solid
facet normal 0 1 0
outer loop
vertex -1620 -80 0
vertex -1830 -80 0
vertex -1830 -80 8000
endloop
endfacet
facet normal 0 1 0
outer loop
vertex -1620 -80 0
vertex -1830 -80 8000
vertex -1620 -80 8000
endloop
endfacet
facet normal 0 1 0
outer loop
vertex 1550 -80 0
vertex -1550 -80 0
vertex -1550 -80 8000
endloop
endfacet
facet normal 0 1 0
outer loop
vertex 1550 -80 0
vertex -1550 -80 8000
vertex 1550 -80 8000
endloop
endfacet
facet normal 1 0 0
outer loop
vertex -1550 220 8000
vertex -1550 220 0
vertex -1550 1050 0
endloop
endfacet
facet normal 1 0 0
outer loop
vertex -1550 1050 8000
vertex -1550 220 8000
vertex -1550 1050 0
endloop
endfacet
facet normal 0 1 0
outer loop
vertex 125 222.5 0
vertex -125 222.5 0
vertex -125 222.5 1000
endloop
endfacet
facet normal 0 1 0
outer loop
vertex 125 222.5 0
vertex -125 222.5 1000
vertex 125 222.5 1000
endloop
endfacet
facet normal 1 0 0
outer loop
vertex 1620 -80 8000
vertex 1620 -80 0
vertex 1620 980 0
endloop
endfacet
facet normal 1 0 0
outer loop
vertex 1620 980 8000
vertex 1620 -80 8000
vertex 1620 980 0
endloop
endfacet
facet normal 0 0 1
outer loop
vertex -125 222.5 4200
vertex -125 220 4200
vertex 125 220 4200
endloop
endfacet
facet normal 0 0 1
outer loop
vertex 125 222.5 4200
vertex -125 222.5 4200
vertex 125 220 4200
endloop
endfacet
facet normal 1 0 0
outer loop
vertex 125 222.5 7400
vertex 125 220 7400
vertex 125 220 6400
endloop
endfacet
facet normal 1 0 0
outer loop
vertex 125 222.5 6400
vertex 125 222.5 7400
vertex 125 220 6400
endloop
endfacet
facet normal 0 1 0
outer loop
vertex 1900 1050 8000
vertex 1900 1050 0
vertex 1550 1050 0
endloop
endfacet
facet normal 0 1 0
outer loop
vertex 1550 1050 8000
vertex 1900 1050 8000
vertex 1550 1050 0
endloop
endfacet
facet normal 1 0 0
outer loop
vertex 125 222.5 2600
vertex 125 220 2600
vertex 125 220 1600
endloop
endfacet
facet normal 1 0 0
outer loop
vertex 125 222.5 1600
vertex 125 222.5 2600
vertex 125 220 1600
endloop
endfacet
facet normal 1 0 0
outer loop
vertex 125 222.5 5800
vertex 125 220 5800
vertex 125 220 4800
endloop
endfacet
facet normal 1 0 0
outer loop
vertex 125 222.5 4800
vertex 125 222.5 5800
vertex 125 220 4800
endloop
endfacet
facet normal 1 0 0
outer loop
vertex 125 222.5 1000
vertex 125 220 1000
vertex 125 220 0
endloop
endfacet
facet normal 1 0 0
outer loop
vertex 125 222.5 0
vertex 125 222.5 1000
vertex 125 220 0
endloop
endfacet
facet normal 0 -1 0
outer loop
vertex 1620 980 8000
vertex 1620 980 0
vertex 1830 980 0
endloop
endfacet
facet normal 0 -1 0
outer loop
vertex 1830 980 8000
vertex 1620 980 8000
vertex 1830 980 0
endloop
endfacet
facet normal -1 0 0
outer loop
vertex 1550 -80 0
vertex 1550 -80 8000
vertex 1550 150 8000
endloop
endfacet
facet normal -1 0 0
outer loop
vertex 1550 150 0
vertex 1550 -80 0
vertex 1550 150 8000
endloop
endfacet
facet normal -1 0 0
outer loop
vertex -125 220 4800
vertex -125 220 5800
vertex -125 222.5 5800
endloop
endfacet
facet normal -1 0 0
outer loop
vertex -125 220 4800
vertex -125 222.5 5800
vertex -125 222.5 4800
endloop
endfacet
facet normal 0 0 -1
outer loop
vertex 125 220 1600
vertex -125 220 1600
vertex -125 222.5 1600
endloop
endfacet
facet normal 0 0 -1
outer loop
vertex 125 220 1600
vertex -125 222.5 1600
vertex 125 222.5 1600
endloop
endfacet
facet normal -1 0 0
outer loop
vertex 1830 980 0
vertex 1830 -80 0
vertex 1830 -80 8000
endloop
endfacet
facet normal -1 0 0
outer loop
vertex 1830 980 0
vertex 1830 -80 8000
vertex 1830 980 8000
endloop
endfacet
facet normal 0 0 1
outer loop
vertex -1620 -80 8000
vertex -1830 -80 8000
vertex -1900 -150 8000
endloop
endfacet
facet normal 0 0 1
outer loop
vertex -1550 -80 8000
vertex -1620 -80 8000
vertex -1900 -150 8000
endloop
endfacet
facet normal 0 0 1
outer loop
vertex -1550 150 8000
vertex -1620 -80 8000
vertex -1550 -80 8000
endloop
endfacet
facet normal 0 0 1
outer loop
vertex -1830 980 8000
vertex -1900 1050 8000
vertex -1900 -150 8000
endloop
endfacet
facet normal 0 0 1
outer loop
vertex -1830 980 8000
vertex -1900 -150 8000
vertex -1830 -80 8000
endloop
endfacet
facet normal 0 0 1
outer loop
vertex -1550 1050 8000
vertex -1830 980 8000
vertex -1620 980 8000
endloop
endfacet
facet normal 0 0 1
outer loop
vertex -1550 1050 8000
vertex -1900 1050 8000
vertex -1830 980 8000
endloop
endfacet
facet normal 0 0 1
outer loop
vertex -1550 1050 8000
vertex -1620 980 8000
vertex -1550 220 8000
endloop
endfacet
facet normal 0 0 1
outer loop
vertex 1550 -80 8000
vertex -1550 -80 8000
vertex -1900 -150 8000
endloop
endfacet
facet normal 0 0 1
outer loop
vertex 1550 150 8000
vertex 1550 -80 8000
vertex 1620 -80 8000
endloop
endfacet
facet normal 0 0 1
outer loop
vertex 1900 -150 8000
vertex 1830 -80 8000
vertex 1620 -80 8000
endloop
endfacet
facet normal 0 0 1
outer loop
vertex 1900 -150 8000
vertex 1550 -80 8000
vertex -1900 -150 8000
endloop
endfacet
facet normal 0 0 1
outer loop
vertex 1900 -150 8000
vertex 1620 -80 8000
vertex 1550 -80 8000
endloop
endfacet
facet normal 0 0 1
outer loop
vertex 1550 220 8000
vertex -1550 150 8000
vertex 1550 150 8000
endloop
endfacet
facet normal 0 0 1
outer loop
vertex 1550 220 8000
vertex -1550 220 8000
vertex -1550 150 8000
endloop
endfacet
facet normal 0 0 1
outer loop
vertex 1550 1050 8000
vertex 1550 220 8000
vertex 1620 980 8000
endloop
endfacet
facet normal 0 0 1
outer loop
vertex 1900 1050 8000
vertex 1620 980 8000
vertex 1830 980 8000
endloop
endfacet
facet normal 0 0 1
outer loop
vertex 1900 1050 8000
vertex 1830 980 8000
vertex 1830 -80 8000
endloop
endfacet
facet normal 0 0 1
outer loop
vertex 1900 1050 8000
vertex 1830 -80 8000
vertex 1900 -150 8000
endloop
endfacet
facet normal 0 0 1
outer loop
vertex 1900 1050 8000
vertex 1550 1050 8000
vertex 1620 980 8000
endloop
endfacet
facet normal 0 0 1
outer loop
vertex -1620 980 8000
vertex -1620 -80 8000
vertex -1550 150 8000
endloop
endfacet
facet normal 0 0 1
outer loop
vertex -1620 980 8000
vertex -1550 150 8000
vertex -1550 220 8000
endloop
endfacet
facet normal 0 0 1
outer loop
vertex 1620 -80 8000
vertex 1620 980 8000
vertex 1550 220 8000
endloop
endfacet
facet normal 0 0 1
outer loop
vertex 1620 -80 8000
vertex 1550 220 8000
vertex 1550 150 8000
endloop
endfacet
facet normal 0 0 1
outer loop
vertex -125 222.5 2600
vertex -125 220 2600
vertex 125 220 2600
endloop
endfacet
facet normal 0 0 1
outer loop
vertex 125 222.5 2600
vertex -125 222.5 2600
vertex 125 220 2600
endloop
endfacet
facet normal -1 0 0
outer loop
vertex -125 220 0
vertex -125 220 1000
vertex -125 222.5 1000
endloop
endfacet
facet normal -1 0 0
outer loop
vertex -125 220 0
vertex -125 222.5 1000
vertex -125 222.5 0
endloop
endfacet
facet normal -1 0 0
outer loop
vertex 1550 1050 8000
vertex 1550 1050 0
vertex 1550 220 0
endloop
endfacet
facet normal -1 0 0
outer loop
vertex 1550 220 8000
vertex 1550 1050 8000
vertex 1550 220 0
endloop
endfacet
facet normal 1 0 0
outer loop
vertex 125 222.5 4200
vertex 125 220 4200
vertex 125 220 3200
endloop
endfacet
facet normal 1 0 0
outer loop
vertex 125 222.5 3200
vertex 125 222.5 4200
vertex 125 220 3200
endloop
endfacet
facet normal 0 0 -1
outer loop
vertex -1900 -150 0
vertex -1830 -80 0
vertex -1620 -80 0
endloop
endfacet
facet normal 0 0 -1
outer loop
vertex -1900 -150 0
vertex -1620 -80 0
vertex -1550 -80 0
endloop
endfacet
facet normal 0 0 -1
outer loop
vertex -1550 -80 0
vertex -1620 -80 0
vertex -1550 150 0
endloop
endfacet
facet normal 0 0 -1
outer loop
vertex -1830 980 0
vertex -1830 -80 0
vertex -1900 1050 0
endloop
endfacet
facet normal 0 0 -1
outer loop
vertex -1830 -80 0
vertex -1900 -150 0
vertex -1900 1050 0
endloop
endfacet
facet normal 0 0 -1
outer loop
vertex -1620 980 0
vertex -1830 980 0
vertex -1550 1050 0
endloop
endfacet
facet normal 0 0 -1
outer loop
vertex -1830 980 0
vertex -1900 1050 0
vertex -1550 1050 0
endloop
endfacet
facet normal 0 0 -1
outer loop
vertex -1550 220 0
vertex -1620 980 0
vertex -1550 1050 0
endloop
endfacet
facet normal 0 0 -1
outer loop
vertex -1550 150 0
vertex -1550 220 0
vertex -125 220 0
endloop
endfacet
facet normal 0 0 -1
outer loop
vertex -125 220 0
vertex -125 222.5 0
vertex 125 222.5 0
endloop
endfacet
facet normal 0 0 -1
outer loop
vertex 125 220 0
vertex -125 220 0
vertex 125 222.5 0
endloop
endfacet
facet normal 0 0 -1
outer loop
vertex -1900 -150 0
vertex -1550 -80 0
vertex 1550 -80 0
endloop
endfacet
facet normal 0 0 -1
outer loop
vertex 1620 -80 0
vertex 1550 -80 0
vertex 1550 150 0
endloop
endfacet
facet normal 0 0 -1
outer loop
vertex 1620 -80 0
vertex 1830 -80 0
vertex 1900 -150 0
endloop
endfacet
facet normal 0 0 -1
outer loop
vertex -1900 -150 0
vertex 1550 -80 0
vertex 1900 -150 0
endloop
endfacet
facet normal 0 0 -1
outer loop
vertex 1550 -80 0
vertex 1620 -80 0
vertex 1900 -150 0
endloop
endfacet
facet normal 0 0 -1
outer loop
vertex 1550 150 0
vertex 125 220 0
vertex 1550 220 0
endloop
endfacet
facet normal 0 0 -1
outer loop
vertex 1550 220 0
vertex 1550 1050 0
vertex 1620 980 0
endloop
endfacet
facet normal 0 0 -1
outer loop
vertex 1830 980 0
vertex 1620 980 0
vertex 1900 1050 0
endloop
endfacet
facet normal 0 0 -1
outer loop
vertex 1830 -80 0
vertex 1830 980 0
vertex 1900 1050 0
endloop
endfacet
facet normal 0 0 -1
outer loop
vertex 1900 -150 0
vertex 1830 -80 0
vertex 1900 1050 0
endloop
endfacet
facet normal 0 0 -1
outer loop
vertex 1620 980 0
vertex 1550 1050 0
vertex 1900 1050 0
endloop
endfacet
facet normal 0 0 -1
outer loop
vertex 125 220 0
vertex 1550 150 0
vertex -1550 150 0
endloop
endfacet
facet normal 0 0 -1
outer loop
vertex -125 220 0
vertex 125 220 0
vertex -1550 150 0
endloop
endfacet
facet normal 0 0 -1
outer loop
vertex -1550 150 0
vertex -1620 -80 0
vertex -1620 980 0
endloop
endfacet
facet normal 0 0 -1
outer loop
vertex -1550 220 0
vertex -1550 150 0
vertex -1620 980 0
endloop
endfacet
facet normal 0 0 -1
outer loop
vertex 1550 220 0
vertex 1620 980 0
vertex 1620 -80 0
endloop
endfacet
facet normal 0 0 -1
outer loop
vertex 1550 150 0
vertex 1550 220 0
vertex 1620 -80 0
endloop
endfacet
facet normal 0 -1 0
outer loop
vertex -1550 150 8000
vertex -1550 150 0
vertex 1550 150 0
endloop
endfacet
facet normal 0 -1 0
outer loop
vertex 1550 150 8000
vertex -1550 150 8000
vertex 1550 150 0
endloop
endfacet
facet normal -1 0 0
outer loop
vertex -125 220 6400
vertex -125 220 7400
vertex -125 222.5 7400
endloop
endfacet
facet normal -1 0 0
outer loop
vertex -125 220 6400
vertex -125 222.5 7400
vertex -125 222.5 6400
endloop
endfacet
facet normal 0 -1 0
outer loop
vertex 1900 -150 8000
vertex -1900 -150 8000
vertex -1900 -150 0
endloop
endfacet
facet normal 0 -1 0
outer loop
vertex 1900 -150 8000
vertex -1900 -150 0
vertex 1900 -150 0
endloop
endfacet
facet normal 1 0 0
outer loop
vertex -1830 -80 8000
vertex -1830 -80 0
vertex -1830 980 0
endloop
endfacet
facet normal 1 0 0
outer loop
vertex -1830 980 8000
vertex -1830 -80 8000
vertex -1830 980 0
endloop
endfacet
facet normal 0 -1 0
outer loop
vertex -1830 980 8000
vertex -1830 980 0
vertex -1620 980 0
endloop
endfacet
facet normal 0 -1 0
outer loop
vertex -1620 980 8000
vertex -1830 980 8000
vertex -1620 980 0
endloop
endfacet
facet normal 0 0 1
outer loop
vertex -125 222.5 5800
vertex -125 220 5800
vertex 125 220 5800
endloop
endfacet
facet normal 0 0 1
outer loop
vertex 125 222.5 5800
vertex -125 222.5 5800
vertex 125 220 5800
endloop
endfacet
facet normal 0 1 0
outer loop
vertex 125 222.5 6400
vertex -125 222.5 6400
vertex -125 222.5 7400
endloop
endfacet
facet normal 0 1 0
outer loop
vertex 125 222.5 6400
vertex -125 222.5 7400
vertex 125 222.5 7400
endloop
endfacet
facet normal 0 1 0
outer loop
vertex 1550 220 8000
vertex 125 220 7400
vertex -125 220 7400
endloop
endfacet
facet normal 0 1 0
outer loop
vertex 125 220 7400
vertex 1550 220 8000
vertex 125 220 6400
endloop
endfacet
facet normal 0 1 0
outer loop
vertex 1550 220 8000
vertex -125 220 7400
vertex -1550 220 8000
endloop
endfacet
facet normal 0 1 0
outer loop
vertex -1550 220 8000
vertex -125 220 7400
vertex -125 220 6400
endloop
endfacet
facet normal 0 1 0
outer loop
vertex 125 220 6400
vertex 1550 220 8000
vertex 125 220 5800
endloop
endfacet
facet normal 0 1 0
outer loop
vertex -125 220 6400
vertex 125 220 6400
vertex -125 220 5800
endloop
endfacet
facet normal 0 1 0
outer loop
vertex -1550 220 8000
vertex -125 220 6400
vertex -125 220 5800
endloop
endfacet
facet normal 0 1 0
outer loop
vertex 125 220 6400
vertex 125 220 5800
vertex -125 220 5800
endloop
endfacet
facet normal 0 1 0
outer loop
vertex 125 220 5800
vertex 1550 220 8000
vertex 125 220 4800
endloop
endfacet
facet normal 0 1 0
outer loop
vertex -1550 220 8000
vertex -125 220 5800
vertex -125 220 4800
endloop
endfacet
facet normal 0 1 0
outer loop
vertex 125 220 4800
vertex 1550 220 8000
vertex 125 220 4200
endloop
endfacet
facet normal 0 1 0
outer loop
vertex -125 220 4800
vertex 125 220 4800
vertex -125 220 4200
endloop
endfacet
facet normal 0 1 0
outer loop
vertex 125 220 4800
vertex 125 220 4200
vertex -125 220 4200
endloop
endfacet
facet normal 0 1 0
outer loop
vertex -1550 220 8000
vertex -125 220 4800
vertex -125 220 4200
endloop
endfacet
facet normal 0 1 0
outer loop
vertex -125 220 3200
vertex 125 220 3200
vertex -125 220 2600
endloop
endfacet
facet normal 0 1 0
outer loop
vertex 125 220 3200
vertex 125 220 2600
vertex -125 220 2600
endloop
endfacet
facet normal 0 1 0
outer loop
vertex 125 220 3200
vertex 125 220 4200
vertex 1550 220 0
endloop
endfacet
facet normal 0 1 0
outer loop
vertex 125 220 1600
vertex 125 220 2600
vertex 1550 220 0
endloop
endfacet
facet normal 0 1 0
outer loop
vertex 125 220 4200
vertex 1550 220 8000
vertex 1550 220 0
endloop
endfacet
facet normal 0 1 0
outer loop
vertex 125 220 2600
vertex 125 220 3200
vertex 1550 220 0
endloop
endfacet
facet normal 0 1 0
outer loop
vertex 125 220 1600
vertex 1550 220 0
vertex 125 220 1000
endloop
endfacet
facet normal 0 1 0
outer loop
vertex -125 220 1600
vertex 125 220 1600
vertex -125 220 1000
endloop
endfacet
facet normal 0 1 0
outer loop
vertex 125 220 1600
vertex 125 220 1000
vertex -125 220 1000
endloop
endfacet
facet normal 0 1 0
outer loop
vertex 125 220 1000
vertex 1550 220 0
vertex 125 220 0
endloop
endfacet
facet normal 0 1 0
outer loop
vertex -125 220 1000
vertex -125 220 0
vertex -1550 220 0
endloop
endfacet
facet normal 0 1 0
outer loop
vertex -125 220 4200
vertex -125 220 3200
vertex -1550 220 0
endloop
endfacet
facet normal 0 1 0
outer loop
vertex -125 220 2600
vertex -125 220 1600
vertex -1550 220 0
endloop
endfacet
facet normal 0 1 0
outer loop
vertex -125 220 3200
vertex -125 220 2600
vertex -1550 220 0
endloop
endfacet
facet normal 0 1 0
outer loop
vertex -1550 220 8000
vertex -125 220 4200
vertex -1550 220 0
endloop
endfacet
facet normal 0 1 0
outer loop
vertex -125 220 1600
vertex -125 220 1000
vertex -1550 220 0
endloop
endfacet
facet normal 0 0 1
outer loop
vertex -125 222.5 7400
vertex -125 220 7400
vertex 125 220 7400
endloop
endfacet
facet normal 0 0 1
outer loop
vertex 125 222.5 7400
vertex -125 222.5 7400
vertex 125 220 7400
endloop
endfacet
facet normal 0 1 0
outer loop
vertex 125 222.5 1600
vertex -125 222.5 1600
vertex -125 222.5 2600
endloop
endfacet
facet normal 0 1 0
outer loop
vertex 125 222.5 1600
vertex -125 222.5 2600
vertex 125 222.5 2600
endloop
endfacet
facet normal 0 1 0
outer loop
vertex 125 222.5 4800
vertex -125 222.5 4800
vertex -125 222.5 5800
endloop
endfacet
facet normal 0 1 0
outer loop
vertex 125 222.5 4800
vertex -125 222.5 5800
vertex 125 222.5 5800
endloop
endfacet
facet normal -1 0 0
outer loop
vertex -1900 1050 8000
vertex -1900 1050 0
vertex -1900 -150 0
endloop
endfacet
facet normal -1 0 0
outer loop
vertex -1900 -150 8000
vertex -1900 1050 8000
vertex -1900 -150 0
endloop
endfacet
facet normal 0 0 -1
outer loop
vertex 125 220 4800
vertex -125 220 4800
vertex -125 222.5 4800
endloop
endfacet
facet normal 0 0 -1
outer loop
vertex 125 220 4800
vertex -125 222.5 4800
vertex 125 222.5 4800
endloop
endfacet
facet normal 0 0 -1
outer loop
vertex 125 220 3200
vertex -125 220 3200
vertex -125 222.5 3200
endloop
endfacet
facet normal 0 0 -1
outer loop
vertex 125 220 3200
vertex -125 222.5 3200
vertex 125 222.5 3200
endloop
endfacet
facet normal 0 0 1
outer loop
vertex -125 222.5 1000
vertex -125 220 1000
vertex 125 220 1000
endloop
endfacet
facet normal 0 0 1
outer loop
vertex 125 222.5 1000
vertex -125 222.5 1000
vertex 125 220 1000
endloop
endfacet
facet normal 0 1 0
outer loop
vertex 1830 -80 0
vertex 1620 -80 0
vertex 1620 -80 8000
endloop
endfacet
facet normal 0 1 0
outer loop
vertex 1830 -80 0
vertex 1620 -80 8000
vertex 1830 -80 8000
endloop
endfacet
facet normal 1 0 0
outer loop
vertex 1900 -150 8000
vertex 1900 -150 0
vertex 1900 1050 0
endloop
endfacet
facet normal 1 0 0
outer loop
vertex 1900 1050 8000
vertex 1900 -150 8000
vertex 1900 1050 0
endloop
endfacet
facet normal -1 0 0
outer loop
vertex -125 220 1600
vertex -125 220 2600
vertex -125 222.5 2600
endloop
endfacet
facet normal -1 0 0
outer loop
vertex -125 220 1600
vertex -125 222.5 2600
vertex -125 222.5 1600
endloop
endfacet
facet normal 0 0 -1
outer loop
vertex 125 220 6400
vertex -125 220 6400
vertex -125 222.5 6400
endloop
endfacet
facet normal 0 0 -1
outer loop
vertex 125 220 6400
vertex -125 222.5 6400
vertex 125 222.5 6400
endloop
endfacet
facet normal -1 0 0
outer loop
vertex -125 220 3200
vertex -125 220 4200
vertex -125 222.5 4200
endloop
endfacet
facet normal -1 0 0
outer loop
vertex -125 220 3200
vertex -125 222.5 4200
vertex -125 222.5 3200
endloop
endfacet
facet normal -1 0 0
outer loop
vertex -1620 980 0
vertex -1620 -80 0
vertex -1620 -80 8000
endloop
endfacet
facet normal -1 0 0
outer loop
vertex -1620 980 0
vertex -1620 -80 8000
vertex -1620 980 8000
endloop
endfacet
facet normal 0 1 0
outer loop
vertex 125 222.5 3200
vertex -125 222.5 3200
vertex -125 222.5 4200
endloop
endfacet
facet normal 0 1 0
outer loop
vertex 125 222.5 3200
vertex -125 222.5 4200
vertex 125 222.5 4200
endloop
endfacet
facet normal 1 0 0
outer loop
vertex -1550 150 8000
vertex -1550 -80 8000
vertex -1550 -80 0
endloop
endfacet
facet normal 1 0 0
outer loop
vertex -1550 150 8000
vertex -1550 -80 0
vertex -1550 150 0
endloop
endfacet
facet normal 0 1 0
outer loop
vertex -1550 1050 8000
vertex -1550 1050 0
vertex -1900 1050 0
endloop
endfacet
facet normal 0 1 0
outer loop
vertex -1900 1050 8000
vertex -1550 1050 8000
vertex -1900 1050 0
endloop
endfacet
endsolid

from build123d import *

# Parameters (mm, degrees)
EXTRUDE_THIN1_OUTLINE_W   = 3100
EXTRUDE_THIN1_OUTLINE_H   = 230
EXTRUDE_THIN1_OUTLINE_W_2 = 210
EXTRUDE_THIN1_OUTLINE_H_2 = 1060
EXTRUDE_THIN1_DEPTH       = 8000
SKETCH4_W                 = 250
SKETCH4_H                 = 1000
BOSS_EXTRUDE2_DEPTH       = 2.5
LPATTERN1_COUNT           = 5
LPATTERN1_PITCH           = 1600


# Read off the part's stored shape, not the designer's step: Extrude-Thin1
with BuildPart() as part:
    # Extrude-Thin1 outline → Extrude-Thin1 (new body)
    with BuildSketch(Plane.XY):
        Polygon((-1900, 1050), (-1900, -150), (1900, -150), (1900, 1050), (1550, 1050), (1550, 220), (-1550, 220), (-1550, 1050), align=None)
        with Locations((0, 35)):
            Rectangle(EXTRUDE_THIN1_OUTLINE_W, EXTRUDE_THIN1_OUTLINE_H, mode=Mode.SUBTRACT)
        with Locations((-1725, 450)):
            Rectangle(EXTRUDE_THIN1_OUTLINE_W_2, EXTRUDE_THIN1_OUTLINE_H_2, mode=Mode.SUBTRACT)
        with Locations((1725, 450)):
            Rectangle(EXTRUDE_THIN1_OUTLINE_W_2, EXTRUDE_THIN1_OUTLINE_H_2, mode=Mode.SUBTRACT)
    extrude(amount=EXTRUDE_THIN1_DEPTH)

    # Sketch4 → Boss-Extrude2 (add)
    with BuildSketch(Plane(origin=(0, 220, 0), x_dir=(1, 0, 0), z_dir=(0, 1, 0))):
        with Locations((0, -500)):
            Rectangle(SKETCH4_W, SKETCH4_H)
    boss_extrude2 = extrude(amount=BOSS_EXTRUDE2_DEPTH)

    # LPattern1: Boss-Extrude2 ×5
    with Locations(*[(0, 0, i * LPATTERN1_PITCH) for i in range(1, LPATTERN1_COUNT)]):
        add(boss_extrude2)


solid = part.part
